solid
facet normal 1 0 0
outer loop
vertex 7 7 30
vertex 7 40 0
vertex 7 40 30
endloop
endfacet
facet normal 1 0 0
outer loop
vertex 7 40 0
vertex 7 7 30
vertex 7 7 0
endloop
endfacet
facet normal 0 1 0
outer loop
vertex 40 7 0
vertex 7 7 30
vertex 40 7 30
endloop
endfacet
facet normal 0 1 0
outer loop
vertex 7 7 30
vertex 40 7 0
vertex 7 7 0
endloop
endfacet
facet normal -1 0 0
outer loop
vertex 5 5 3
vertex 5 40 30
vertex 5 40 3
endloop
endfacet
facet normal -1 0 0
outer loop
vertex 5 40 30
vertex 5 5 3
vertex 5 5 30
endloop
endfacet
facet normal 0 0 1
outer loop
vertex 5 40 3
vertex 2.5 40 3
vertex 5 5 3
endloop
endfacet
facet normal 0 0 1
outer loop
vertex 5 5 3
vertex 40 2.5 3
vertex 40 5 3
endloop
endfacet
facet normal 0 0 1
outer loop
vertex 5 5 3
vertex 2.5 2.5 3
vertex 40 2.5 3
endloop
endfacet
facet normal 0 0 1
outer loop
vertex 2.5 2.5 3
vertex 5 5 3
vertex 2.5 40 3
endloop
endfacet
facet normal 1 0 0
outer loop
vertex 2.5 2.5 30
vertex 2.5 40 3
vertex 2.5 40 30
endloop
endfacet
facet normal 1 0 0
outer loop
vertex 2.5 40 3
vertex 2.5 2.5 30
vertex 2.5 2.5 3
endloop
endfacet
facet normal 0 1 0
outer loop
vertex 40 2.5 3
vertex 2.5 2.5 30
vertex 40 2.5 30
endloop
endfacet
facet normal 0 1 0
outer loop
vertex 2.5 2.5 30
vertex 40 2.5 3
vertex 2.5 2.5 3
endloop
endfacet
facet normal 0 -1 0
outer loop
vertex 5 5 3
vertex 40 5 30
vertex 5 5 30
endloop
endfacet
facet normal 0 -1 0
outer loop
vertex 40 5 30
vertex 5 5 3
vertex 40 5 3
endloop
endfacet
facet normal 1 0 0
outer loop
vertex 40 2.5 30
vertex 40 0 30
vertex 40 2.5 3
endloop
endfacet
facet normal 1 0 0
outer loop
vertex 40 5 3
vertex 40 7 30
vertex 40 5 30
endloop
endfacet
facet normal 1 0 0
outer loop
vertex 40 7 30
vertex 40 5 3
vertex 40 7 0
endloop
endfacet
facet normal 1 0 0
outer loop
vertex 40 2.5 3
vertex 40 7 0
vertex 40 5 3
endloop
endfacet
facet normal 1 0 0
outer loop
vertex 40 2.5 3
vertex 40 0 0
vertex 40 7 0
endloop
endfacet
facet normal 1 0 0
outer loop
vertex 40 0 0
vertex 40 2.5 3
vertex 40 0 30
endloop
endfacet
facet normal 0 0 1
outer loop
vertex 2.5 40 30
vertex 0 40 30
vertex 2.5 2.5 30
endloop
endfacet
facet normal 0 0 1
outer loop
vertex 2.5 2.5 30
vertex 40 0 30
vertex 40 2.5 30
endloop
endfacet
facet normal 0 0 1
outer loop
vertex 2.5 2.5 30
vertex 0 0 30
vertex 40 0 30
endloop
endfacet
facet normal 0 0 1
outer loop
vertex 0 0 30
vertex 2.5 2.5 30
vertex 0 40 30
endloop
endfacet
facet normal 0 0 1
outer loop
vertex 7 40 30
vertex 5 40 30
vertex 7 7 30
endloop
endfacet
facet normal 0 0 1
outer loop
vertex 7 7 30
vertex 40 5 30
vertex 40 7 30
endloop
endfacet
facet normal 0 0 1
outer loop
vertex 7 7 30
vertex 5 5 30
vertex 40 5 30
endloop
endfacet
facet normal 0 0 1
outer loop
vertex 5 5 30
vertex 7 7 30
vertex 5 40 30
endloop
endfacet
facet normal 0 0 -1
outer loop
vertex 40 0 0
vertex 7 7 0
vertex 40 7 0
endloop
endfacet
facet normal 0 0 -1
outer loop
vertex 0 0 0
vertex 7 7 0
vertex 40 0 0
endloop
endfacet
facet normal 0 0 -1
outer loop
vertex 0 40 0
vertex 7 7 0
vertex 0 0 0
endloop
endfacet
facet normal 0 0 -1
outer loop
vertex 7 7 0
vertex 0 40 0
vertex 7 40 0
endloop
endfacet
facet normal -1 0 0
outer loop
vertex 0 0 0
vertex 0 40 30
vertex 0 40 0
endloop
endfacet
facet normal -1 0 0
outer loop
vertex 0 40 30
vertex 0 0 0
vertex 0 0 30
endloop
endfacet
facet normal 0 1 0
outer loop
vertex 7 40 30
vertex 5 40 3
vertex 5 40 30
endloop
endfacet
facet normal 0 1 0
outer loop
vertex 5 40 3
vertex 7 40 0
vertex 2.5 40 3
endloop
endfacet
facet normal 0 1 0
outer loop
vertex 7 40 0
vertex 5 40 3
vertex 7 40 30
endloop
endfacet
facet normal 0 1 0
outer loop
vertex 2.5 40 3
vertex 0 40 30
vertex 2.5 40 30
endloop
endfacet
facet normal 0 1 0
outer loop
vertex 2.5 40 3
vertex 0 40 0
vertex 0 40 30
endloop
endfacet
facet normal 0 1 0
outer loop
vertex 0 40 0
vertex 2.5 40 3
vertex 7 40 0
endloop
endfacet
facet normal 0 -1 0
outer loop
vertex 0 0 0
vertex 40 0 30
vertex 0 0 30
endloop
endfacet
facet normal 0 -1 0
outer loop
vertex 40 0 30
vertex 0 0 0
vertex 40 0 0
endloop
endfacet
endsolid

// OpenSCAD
module bracket(height,sheet_width)
{
	difference()
	{
		union()
		{
			cube([40,40,height]);

		}
		union()
		{
			translate([5+sheet_width,5+sheet_width,-1]) cube([40,40,height+10]);
			translate([sheet_width+0.5,sheet_width+0.5,3]) cube ([sheet_width+0.5,40,height]);
			translate([sheet_width+0.5,sheet_width+0.5,3]) cube ([40,sheet_width+0.5,height]);
		}
	}
}

bracket(30,2);
